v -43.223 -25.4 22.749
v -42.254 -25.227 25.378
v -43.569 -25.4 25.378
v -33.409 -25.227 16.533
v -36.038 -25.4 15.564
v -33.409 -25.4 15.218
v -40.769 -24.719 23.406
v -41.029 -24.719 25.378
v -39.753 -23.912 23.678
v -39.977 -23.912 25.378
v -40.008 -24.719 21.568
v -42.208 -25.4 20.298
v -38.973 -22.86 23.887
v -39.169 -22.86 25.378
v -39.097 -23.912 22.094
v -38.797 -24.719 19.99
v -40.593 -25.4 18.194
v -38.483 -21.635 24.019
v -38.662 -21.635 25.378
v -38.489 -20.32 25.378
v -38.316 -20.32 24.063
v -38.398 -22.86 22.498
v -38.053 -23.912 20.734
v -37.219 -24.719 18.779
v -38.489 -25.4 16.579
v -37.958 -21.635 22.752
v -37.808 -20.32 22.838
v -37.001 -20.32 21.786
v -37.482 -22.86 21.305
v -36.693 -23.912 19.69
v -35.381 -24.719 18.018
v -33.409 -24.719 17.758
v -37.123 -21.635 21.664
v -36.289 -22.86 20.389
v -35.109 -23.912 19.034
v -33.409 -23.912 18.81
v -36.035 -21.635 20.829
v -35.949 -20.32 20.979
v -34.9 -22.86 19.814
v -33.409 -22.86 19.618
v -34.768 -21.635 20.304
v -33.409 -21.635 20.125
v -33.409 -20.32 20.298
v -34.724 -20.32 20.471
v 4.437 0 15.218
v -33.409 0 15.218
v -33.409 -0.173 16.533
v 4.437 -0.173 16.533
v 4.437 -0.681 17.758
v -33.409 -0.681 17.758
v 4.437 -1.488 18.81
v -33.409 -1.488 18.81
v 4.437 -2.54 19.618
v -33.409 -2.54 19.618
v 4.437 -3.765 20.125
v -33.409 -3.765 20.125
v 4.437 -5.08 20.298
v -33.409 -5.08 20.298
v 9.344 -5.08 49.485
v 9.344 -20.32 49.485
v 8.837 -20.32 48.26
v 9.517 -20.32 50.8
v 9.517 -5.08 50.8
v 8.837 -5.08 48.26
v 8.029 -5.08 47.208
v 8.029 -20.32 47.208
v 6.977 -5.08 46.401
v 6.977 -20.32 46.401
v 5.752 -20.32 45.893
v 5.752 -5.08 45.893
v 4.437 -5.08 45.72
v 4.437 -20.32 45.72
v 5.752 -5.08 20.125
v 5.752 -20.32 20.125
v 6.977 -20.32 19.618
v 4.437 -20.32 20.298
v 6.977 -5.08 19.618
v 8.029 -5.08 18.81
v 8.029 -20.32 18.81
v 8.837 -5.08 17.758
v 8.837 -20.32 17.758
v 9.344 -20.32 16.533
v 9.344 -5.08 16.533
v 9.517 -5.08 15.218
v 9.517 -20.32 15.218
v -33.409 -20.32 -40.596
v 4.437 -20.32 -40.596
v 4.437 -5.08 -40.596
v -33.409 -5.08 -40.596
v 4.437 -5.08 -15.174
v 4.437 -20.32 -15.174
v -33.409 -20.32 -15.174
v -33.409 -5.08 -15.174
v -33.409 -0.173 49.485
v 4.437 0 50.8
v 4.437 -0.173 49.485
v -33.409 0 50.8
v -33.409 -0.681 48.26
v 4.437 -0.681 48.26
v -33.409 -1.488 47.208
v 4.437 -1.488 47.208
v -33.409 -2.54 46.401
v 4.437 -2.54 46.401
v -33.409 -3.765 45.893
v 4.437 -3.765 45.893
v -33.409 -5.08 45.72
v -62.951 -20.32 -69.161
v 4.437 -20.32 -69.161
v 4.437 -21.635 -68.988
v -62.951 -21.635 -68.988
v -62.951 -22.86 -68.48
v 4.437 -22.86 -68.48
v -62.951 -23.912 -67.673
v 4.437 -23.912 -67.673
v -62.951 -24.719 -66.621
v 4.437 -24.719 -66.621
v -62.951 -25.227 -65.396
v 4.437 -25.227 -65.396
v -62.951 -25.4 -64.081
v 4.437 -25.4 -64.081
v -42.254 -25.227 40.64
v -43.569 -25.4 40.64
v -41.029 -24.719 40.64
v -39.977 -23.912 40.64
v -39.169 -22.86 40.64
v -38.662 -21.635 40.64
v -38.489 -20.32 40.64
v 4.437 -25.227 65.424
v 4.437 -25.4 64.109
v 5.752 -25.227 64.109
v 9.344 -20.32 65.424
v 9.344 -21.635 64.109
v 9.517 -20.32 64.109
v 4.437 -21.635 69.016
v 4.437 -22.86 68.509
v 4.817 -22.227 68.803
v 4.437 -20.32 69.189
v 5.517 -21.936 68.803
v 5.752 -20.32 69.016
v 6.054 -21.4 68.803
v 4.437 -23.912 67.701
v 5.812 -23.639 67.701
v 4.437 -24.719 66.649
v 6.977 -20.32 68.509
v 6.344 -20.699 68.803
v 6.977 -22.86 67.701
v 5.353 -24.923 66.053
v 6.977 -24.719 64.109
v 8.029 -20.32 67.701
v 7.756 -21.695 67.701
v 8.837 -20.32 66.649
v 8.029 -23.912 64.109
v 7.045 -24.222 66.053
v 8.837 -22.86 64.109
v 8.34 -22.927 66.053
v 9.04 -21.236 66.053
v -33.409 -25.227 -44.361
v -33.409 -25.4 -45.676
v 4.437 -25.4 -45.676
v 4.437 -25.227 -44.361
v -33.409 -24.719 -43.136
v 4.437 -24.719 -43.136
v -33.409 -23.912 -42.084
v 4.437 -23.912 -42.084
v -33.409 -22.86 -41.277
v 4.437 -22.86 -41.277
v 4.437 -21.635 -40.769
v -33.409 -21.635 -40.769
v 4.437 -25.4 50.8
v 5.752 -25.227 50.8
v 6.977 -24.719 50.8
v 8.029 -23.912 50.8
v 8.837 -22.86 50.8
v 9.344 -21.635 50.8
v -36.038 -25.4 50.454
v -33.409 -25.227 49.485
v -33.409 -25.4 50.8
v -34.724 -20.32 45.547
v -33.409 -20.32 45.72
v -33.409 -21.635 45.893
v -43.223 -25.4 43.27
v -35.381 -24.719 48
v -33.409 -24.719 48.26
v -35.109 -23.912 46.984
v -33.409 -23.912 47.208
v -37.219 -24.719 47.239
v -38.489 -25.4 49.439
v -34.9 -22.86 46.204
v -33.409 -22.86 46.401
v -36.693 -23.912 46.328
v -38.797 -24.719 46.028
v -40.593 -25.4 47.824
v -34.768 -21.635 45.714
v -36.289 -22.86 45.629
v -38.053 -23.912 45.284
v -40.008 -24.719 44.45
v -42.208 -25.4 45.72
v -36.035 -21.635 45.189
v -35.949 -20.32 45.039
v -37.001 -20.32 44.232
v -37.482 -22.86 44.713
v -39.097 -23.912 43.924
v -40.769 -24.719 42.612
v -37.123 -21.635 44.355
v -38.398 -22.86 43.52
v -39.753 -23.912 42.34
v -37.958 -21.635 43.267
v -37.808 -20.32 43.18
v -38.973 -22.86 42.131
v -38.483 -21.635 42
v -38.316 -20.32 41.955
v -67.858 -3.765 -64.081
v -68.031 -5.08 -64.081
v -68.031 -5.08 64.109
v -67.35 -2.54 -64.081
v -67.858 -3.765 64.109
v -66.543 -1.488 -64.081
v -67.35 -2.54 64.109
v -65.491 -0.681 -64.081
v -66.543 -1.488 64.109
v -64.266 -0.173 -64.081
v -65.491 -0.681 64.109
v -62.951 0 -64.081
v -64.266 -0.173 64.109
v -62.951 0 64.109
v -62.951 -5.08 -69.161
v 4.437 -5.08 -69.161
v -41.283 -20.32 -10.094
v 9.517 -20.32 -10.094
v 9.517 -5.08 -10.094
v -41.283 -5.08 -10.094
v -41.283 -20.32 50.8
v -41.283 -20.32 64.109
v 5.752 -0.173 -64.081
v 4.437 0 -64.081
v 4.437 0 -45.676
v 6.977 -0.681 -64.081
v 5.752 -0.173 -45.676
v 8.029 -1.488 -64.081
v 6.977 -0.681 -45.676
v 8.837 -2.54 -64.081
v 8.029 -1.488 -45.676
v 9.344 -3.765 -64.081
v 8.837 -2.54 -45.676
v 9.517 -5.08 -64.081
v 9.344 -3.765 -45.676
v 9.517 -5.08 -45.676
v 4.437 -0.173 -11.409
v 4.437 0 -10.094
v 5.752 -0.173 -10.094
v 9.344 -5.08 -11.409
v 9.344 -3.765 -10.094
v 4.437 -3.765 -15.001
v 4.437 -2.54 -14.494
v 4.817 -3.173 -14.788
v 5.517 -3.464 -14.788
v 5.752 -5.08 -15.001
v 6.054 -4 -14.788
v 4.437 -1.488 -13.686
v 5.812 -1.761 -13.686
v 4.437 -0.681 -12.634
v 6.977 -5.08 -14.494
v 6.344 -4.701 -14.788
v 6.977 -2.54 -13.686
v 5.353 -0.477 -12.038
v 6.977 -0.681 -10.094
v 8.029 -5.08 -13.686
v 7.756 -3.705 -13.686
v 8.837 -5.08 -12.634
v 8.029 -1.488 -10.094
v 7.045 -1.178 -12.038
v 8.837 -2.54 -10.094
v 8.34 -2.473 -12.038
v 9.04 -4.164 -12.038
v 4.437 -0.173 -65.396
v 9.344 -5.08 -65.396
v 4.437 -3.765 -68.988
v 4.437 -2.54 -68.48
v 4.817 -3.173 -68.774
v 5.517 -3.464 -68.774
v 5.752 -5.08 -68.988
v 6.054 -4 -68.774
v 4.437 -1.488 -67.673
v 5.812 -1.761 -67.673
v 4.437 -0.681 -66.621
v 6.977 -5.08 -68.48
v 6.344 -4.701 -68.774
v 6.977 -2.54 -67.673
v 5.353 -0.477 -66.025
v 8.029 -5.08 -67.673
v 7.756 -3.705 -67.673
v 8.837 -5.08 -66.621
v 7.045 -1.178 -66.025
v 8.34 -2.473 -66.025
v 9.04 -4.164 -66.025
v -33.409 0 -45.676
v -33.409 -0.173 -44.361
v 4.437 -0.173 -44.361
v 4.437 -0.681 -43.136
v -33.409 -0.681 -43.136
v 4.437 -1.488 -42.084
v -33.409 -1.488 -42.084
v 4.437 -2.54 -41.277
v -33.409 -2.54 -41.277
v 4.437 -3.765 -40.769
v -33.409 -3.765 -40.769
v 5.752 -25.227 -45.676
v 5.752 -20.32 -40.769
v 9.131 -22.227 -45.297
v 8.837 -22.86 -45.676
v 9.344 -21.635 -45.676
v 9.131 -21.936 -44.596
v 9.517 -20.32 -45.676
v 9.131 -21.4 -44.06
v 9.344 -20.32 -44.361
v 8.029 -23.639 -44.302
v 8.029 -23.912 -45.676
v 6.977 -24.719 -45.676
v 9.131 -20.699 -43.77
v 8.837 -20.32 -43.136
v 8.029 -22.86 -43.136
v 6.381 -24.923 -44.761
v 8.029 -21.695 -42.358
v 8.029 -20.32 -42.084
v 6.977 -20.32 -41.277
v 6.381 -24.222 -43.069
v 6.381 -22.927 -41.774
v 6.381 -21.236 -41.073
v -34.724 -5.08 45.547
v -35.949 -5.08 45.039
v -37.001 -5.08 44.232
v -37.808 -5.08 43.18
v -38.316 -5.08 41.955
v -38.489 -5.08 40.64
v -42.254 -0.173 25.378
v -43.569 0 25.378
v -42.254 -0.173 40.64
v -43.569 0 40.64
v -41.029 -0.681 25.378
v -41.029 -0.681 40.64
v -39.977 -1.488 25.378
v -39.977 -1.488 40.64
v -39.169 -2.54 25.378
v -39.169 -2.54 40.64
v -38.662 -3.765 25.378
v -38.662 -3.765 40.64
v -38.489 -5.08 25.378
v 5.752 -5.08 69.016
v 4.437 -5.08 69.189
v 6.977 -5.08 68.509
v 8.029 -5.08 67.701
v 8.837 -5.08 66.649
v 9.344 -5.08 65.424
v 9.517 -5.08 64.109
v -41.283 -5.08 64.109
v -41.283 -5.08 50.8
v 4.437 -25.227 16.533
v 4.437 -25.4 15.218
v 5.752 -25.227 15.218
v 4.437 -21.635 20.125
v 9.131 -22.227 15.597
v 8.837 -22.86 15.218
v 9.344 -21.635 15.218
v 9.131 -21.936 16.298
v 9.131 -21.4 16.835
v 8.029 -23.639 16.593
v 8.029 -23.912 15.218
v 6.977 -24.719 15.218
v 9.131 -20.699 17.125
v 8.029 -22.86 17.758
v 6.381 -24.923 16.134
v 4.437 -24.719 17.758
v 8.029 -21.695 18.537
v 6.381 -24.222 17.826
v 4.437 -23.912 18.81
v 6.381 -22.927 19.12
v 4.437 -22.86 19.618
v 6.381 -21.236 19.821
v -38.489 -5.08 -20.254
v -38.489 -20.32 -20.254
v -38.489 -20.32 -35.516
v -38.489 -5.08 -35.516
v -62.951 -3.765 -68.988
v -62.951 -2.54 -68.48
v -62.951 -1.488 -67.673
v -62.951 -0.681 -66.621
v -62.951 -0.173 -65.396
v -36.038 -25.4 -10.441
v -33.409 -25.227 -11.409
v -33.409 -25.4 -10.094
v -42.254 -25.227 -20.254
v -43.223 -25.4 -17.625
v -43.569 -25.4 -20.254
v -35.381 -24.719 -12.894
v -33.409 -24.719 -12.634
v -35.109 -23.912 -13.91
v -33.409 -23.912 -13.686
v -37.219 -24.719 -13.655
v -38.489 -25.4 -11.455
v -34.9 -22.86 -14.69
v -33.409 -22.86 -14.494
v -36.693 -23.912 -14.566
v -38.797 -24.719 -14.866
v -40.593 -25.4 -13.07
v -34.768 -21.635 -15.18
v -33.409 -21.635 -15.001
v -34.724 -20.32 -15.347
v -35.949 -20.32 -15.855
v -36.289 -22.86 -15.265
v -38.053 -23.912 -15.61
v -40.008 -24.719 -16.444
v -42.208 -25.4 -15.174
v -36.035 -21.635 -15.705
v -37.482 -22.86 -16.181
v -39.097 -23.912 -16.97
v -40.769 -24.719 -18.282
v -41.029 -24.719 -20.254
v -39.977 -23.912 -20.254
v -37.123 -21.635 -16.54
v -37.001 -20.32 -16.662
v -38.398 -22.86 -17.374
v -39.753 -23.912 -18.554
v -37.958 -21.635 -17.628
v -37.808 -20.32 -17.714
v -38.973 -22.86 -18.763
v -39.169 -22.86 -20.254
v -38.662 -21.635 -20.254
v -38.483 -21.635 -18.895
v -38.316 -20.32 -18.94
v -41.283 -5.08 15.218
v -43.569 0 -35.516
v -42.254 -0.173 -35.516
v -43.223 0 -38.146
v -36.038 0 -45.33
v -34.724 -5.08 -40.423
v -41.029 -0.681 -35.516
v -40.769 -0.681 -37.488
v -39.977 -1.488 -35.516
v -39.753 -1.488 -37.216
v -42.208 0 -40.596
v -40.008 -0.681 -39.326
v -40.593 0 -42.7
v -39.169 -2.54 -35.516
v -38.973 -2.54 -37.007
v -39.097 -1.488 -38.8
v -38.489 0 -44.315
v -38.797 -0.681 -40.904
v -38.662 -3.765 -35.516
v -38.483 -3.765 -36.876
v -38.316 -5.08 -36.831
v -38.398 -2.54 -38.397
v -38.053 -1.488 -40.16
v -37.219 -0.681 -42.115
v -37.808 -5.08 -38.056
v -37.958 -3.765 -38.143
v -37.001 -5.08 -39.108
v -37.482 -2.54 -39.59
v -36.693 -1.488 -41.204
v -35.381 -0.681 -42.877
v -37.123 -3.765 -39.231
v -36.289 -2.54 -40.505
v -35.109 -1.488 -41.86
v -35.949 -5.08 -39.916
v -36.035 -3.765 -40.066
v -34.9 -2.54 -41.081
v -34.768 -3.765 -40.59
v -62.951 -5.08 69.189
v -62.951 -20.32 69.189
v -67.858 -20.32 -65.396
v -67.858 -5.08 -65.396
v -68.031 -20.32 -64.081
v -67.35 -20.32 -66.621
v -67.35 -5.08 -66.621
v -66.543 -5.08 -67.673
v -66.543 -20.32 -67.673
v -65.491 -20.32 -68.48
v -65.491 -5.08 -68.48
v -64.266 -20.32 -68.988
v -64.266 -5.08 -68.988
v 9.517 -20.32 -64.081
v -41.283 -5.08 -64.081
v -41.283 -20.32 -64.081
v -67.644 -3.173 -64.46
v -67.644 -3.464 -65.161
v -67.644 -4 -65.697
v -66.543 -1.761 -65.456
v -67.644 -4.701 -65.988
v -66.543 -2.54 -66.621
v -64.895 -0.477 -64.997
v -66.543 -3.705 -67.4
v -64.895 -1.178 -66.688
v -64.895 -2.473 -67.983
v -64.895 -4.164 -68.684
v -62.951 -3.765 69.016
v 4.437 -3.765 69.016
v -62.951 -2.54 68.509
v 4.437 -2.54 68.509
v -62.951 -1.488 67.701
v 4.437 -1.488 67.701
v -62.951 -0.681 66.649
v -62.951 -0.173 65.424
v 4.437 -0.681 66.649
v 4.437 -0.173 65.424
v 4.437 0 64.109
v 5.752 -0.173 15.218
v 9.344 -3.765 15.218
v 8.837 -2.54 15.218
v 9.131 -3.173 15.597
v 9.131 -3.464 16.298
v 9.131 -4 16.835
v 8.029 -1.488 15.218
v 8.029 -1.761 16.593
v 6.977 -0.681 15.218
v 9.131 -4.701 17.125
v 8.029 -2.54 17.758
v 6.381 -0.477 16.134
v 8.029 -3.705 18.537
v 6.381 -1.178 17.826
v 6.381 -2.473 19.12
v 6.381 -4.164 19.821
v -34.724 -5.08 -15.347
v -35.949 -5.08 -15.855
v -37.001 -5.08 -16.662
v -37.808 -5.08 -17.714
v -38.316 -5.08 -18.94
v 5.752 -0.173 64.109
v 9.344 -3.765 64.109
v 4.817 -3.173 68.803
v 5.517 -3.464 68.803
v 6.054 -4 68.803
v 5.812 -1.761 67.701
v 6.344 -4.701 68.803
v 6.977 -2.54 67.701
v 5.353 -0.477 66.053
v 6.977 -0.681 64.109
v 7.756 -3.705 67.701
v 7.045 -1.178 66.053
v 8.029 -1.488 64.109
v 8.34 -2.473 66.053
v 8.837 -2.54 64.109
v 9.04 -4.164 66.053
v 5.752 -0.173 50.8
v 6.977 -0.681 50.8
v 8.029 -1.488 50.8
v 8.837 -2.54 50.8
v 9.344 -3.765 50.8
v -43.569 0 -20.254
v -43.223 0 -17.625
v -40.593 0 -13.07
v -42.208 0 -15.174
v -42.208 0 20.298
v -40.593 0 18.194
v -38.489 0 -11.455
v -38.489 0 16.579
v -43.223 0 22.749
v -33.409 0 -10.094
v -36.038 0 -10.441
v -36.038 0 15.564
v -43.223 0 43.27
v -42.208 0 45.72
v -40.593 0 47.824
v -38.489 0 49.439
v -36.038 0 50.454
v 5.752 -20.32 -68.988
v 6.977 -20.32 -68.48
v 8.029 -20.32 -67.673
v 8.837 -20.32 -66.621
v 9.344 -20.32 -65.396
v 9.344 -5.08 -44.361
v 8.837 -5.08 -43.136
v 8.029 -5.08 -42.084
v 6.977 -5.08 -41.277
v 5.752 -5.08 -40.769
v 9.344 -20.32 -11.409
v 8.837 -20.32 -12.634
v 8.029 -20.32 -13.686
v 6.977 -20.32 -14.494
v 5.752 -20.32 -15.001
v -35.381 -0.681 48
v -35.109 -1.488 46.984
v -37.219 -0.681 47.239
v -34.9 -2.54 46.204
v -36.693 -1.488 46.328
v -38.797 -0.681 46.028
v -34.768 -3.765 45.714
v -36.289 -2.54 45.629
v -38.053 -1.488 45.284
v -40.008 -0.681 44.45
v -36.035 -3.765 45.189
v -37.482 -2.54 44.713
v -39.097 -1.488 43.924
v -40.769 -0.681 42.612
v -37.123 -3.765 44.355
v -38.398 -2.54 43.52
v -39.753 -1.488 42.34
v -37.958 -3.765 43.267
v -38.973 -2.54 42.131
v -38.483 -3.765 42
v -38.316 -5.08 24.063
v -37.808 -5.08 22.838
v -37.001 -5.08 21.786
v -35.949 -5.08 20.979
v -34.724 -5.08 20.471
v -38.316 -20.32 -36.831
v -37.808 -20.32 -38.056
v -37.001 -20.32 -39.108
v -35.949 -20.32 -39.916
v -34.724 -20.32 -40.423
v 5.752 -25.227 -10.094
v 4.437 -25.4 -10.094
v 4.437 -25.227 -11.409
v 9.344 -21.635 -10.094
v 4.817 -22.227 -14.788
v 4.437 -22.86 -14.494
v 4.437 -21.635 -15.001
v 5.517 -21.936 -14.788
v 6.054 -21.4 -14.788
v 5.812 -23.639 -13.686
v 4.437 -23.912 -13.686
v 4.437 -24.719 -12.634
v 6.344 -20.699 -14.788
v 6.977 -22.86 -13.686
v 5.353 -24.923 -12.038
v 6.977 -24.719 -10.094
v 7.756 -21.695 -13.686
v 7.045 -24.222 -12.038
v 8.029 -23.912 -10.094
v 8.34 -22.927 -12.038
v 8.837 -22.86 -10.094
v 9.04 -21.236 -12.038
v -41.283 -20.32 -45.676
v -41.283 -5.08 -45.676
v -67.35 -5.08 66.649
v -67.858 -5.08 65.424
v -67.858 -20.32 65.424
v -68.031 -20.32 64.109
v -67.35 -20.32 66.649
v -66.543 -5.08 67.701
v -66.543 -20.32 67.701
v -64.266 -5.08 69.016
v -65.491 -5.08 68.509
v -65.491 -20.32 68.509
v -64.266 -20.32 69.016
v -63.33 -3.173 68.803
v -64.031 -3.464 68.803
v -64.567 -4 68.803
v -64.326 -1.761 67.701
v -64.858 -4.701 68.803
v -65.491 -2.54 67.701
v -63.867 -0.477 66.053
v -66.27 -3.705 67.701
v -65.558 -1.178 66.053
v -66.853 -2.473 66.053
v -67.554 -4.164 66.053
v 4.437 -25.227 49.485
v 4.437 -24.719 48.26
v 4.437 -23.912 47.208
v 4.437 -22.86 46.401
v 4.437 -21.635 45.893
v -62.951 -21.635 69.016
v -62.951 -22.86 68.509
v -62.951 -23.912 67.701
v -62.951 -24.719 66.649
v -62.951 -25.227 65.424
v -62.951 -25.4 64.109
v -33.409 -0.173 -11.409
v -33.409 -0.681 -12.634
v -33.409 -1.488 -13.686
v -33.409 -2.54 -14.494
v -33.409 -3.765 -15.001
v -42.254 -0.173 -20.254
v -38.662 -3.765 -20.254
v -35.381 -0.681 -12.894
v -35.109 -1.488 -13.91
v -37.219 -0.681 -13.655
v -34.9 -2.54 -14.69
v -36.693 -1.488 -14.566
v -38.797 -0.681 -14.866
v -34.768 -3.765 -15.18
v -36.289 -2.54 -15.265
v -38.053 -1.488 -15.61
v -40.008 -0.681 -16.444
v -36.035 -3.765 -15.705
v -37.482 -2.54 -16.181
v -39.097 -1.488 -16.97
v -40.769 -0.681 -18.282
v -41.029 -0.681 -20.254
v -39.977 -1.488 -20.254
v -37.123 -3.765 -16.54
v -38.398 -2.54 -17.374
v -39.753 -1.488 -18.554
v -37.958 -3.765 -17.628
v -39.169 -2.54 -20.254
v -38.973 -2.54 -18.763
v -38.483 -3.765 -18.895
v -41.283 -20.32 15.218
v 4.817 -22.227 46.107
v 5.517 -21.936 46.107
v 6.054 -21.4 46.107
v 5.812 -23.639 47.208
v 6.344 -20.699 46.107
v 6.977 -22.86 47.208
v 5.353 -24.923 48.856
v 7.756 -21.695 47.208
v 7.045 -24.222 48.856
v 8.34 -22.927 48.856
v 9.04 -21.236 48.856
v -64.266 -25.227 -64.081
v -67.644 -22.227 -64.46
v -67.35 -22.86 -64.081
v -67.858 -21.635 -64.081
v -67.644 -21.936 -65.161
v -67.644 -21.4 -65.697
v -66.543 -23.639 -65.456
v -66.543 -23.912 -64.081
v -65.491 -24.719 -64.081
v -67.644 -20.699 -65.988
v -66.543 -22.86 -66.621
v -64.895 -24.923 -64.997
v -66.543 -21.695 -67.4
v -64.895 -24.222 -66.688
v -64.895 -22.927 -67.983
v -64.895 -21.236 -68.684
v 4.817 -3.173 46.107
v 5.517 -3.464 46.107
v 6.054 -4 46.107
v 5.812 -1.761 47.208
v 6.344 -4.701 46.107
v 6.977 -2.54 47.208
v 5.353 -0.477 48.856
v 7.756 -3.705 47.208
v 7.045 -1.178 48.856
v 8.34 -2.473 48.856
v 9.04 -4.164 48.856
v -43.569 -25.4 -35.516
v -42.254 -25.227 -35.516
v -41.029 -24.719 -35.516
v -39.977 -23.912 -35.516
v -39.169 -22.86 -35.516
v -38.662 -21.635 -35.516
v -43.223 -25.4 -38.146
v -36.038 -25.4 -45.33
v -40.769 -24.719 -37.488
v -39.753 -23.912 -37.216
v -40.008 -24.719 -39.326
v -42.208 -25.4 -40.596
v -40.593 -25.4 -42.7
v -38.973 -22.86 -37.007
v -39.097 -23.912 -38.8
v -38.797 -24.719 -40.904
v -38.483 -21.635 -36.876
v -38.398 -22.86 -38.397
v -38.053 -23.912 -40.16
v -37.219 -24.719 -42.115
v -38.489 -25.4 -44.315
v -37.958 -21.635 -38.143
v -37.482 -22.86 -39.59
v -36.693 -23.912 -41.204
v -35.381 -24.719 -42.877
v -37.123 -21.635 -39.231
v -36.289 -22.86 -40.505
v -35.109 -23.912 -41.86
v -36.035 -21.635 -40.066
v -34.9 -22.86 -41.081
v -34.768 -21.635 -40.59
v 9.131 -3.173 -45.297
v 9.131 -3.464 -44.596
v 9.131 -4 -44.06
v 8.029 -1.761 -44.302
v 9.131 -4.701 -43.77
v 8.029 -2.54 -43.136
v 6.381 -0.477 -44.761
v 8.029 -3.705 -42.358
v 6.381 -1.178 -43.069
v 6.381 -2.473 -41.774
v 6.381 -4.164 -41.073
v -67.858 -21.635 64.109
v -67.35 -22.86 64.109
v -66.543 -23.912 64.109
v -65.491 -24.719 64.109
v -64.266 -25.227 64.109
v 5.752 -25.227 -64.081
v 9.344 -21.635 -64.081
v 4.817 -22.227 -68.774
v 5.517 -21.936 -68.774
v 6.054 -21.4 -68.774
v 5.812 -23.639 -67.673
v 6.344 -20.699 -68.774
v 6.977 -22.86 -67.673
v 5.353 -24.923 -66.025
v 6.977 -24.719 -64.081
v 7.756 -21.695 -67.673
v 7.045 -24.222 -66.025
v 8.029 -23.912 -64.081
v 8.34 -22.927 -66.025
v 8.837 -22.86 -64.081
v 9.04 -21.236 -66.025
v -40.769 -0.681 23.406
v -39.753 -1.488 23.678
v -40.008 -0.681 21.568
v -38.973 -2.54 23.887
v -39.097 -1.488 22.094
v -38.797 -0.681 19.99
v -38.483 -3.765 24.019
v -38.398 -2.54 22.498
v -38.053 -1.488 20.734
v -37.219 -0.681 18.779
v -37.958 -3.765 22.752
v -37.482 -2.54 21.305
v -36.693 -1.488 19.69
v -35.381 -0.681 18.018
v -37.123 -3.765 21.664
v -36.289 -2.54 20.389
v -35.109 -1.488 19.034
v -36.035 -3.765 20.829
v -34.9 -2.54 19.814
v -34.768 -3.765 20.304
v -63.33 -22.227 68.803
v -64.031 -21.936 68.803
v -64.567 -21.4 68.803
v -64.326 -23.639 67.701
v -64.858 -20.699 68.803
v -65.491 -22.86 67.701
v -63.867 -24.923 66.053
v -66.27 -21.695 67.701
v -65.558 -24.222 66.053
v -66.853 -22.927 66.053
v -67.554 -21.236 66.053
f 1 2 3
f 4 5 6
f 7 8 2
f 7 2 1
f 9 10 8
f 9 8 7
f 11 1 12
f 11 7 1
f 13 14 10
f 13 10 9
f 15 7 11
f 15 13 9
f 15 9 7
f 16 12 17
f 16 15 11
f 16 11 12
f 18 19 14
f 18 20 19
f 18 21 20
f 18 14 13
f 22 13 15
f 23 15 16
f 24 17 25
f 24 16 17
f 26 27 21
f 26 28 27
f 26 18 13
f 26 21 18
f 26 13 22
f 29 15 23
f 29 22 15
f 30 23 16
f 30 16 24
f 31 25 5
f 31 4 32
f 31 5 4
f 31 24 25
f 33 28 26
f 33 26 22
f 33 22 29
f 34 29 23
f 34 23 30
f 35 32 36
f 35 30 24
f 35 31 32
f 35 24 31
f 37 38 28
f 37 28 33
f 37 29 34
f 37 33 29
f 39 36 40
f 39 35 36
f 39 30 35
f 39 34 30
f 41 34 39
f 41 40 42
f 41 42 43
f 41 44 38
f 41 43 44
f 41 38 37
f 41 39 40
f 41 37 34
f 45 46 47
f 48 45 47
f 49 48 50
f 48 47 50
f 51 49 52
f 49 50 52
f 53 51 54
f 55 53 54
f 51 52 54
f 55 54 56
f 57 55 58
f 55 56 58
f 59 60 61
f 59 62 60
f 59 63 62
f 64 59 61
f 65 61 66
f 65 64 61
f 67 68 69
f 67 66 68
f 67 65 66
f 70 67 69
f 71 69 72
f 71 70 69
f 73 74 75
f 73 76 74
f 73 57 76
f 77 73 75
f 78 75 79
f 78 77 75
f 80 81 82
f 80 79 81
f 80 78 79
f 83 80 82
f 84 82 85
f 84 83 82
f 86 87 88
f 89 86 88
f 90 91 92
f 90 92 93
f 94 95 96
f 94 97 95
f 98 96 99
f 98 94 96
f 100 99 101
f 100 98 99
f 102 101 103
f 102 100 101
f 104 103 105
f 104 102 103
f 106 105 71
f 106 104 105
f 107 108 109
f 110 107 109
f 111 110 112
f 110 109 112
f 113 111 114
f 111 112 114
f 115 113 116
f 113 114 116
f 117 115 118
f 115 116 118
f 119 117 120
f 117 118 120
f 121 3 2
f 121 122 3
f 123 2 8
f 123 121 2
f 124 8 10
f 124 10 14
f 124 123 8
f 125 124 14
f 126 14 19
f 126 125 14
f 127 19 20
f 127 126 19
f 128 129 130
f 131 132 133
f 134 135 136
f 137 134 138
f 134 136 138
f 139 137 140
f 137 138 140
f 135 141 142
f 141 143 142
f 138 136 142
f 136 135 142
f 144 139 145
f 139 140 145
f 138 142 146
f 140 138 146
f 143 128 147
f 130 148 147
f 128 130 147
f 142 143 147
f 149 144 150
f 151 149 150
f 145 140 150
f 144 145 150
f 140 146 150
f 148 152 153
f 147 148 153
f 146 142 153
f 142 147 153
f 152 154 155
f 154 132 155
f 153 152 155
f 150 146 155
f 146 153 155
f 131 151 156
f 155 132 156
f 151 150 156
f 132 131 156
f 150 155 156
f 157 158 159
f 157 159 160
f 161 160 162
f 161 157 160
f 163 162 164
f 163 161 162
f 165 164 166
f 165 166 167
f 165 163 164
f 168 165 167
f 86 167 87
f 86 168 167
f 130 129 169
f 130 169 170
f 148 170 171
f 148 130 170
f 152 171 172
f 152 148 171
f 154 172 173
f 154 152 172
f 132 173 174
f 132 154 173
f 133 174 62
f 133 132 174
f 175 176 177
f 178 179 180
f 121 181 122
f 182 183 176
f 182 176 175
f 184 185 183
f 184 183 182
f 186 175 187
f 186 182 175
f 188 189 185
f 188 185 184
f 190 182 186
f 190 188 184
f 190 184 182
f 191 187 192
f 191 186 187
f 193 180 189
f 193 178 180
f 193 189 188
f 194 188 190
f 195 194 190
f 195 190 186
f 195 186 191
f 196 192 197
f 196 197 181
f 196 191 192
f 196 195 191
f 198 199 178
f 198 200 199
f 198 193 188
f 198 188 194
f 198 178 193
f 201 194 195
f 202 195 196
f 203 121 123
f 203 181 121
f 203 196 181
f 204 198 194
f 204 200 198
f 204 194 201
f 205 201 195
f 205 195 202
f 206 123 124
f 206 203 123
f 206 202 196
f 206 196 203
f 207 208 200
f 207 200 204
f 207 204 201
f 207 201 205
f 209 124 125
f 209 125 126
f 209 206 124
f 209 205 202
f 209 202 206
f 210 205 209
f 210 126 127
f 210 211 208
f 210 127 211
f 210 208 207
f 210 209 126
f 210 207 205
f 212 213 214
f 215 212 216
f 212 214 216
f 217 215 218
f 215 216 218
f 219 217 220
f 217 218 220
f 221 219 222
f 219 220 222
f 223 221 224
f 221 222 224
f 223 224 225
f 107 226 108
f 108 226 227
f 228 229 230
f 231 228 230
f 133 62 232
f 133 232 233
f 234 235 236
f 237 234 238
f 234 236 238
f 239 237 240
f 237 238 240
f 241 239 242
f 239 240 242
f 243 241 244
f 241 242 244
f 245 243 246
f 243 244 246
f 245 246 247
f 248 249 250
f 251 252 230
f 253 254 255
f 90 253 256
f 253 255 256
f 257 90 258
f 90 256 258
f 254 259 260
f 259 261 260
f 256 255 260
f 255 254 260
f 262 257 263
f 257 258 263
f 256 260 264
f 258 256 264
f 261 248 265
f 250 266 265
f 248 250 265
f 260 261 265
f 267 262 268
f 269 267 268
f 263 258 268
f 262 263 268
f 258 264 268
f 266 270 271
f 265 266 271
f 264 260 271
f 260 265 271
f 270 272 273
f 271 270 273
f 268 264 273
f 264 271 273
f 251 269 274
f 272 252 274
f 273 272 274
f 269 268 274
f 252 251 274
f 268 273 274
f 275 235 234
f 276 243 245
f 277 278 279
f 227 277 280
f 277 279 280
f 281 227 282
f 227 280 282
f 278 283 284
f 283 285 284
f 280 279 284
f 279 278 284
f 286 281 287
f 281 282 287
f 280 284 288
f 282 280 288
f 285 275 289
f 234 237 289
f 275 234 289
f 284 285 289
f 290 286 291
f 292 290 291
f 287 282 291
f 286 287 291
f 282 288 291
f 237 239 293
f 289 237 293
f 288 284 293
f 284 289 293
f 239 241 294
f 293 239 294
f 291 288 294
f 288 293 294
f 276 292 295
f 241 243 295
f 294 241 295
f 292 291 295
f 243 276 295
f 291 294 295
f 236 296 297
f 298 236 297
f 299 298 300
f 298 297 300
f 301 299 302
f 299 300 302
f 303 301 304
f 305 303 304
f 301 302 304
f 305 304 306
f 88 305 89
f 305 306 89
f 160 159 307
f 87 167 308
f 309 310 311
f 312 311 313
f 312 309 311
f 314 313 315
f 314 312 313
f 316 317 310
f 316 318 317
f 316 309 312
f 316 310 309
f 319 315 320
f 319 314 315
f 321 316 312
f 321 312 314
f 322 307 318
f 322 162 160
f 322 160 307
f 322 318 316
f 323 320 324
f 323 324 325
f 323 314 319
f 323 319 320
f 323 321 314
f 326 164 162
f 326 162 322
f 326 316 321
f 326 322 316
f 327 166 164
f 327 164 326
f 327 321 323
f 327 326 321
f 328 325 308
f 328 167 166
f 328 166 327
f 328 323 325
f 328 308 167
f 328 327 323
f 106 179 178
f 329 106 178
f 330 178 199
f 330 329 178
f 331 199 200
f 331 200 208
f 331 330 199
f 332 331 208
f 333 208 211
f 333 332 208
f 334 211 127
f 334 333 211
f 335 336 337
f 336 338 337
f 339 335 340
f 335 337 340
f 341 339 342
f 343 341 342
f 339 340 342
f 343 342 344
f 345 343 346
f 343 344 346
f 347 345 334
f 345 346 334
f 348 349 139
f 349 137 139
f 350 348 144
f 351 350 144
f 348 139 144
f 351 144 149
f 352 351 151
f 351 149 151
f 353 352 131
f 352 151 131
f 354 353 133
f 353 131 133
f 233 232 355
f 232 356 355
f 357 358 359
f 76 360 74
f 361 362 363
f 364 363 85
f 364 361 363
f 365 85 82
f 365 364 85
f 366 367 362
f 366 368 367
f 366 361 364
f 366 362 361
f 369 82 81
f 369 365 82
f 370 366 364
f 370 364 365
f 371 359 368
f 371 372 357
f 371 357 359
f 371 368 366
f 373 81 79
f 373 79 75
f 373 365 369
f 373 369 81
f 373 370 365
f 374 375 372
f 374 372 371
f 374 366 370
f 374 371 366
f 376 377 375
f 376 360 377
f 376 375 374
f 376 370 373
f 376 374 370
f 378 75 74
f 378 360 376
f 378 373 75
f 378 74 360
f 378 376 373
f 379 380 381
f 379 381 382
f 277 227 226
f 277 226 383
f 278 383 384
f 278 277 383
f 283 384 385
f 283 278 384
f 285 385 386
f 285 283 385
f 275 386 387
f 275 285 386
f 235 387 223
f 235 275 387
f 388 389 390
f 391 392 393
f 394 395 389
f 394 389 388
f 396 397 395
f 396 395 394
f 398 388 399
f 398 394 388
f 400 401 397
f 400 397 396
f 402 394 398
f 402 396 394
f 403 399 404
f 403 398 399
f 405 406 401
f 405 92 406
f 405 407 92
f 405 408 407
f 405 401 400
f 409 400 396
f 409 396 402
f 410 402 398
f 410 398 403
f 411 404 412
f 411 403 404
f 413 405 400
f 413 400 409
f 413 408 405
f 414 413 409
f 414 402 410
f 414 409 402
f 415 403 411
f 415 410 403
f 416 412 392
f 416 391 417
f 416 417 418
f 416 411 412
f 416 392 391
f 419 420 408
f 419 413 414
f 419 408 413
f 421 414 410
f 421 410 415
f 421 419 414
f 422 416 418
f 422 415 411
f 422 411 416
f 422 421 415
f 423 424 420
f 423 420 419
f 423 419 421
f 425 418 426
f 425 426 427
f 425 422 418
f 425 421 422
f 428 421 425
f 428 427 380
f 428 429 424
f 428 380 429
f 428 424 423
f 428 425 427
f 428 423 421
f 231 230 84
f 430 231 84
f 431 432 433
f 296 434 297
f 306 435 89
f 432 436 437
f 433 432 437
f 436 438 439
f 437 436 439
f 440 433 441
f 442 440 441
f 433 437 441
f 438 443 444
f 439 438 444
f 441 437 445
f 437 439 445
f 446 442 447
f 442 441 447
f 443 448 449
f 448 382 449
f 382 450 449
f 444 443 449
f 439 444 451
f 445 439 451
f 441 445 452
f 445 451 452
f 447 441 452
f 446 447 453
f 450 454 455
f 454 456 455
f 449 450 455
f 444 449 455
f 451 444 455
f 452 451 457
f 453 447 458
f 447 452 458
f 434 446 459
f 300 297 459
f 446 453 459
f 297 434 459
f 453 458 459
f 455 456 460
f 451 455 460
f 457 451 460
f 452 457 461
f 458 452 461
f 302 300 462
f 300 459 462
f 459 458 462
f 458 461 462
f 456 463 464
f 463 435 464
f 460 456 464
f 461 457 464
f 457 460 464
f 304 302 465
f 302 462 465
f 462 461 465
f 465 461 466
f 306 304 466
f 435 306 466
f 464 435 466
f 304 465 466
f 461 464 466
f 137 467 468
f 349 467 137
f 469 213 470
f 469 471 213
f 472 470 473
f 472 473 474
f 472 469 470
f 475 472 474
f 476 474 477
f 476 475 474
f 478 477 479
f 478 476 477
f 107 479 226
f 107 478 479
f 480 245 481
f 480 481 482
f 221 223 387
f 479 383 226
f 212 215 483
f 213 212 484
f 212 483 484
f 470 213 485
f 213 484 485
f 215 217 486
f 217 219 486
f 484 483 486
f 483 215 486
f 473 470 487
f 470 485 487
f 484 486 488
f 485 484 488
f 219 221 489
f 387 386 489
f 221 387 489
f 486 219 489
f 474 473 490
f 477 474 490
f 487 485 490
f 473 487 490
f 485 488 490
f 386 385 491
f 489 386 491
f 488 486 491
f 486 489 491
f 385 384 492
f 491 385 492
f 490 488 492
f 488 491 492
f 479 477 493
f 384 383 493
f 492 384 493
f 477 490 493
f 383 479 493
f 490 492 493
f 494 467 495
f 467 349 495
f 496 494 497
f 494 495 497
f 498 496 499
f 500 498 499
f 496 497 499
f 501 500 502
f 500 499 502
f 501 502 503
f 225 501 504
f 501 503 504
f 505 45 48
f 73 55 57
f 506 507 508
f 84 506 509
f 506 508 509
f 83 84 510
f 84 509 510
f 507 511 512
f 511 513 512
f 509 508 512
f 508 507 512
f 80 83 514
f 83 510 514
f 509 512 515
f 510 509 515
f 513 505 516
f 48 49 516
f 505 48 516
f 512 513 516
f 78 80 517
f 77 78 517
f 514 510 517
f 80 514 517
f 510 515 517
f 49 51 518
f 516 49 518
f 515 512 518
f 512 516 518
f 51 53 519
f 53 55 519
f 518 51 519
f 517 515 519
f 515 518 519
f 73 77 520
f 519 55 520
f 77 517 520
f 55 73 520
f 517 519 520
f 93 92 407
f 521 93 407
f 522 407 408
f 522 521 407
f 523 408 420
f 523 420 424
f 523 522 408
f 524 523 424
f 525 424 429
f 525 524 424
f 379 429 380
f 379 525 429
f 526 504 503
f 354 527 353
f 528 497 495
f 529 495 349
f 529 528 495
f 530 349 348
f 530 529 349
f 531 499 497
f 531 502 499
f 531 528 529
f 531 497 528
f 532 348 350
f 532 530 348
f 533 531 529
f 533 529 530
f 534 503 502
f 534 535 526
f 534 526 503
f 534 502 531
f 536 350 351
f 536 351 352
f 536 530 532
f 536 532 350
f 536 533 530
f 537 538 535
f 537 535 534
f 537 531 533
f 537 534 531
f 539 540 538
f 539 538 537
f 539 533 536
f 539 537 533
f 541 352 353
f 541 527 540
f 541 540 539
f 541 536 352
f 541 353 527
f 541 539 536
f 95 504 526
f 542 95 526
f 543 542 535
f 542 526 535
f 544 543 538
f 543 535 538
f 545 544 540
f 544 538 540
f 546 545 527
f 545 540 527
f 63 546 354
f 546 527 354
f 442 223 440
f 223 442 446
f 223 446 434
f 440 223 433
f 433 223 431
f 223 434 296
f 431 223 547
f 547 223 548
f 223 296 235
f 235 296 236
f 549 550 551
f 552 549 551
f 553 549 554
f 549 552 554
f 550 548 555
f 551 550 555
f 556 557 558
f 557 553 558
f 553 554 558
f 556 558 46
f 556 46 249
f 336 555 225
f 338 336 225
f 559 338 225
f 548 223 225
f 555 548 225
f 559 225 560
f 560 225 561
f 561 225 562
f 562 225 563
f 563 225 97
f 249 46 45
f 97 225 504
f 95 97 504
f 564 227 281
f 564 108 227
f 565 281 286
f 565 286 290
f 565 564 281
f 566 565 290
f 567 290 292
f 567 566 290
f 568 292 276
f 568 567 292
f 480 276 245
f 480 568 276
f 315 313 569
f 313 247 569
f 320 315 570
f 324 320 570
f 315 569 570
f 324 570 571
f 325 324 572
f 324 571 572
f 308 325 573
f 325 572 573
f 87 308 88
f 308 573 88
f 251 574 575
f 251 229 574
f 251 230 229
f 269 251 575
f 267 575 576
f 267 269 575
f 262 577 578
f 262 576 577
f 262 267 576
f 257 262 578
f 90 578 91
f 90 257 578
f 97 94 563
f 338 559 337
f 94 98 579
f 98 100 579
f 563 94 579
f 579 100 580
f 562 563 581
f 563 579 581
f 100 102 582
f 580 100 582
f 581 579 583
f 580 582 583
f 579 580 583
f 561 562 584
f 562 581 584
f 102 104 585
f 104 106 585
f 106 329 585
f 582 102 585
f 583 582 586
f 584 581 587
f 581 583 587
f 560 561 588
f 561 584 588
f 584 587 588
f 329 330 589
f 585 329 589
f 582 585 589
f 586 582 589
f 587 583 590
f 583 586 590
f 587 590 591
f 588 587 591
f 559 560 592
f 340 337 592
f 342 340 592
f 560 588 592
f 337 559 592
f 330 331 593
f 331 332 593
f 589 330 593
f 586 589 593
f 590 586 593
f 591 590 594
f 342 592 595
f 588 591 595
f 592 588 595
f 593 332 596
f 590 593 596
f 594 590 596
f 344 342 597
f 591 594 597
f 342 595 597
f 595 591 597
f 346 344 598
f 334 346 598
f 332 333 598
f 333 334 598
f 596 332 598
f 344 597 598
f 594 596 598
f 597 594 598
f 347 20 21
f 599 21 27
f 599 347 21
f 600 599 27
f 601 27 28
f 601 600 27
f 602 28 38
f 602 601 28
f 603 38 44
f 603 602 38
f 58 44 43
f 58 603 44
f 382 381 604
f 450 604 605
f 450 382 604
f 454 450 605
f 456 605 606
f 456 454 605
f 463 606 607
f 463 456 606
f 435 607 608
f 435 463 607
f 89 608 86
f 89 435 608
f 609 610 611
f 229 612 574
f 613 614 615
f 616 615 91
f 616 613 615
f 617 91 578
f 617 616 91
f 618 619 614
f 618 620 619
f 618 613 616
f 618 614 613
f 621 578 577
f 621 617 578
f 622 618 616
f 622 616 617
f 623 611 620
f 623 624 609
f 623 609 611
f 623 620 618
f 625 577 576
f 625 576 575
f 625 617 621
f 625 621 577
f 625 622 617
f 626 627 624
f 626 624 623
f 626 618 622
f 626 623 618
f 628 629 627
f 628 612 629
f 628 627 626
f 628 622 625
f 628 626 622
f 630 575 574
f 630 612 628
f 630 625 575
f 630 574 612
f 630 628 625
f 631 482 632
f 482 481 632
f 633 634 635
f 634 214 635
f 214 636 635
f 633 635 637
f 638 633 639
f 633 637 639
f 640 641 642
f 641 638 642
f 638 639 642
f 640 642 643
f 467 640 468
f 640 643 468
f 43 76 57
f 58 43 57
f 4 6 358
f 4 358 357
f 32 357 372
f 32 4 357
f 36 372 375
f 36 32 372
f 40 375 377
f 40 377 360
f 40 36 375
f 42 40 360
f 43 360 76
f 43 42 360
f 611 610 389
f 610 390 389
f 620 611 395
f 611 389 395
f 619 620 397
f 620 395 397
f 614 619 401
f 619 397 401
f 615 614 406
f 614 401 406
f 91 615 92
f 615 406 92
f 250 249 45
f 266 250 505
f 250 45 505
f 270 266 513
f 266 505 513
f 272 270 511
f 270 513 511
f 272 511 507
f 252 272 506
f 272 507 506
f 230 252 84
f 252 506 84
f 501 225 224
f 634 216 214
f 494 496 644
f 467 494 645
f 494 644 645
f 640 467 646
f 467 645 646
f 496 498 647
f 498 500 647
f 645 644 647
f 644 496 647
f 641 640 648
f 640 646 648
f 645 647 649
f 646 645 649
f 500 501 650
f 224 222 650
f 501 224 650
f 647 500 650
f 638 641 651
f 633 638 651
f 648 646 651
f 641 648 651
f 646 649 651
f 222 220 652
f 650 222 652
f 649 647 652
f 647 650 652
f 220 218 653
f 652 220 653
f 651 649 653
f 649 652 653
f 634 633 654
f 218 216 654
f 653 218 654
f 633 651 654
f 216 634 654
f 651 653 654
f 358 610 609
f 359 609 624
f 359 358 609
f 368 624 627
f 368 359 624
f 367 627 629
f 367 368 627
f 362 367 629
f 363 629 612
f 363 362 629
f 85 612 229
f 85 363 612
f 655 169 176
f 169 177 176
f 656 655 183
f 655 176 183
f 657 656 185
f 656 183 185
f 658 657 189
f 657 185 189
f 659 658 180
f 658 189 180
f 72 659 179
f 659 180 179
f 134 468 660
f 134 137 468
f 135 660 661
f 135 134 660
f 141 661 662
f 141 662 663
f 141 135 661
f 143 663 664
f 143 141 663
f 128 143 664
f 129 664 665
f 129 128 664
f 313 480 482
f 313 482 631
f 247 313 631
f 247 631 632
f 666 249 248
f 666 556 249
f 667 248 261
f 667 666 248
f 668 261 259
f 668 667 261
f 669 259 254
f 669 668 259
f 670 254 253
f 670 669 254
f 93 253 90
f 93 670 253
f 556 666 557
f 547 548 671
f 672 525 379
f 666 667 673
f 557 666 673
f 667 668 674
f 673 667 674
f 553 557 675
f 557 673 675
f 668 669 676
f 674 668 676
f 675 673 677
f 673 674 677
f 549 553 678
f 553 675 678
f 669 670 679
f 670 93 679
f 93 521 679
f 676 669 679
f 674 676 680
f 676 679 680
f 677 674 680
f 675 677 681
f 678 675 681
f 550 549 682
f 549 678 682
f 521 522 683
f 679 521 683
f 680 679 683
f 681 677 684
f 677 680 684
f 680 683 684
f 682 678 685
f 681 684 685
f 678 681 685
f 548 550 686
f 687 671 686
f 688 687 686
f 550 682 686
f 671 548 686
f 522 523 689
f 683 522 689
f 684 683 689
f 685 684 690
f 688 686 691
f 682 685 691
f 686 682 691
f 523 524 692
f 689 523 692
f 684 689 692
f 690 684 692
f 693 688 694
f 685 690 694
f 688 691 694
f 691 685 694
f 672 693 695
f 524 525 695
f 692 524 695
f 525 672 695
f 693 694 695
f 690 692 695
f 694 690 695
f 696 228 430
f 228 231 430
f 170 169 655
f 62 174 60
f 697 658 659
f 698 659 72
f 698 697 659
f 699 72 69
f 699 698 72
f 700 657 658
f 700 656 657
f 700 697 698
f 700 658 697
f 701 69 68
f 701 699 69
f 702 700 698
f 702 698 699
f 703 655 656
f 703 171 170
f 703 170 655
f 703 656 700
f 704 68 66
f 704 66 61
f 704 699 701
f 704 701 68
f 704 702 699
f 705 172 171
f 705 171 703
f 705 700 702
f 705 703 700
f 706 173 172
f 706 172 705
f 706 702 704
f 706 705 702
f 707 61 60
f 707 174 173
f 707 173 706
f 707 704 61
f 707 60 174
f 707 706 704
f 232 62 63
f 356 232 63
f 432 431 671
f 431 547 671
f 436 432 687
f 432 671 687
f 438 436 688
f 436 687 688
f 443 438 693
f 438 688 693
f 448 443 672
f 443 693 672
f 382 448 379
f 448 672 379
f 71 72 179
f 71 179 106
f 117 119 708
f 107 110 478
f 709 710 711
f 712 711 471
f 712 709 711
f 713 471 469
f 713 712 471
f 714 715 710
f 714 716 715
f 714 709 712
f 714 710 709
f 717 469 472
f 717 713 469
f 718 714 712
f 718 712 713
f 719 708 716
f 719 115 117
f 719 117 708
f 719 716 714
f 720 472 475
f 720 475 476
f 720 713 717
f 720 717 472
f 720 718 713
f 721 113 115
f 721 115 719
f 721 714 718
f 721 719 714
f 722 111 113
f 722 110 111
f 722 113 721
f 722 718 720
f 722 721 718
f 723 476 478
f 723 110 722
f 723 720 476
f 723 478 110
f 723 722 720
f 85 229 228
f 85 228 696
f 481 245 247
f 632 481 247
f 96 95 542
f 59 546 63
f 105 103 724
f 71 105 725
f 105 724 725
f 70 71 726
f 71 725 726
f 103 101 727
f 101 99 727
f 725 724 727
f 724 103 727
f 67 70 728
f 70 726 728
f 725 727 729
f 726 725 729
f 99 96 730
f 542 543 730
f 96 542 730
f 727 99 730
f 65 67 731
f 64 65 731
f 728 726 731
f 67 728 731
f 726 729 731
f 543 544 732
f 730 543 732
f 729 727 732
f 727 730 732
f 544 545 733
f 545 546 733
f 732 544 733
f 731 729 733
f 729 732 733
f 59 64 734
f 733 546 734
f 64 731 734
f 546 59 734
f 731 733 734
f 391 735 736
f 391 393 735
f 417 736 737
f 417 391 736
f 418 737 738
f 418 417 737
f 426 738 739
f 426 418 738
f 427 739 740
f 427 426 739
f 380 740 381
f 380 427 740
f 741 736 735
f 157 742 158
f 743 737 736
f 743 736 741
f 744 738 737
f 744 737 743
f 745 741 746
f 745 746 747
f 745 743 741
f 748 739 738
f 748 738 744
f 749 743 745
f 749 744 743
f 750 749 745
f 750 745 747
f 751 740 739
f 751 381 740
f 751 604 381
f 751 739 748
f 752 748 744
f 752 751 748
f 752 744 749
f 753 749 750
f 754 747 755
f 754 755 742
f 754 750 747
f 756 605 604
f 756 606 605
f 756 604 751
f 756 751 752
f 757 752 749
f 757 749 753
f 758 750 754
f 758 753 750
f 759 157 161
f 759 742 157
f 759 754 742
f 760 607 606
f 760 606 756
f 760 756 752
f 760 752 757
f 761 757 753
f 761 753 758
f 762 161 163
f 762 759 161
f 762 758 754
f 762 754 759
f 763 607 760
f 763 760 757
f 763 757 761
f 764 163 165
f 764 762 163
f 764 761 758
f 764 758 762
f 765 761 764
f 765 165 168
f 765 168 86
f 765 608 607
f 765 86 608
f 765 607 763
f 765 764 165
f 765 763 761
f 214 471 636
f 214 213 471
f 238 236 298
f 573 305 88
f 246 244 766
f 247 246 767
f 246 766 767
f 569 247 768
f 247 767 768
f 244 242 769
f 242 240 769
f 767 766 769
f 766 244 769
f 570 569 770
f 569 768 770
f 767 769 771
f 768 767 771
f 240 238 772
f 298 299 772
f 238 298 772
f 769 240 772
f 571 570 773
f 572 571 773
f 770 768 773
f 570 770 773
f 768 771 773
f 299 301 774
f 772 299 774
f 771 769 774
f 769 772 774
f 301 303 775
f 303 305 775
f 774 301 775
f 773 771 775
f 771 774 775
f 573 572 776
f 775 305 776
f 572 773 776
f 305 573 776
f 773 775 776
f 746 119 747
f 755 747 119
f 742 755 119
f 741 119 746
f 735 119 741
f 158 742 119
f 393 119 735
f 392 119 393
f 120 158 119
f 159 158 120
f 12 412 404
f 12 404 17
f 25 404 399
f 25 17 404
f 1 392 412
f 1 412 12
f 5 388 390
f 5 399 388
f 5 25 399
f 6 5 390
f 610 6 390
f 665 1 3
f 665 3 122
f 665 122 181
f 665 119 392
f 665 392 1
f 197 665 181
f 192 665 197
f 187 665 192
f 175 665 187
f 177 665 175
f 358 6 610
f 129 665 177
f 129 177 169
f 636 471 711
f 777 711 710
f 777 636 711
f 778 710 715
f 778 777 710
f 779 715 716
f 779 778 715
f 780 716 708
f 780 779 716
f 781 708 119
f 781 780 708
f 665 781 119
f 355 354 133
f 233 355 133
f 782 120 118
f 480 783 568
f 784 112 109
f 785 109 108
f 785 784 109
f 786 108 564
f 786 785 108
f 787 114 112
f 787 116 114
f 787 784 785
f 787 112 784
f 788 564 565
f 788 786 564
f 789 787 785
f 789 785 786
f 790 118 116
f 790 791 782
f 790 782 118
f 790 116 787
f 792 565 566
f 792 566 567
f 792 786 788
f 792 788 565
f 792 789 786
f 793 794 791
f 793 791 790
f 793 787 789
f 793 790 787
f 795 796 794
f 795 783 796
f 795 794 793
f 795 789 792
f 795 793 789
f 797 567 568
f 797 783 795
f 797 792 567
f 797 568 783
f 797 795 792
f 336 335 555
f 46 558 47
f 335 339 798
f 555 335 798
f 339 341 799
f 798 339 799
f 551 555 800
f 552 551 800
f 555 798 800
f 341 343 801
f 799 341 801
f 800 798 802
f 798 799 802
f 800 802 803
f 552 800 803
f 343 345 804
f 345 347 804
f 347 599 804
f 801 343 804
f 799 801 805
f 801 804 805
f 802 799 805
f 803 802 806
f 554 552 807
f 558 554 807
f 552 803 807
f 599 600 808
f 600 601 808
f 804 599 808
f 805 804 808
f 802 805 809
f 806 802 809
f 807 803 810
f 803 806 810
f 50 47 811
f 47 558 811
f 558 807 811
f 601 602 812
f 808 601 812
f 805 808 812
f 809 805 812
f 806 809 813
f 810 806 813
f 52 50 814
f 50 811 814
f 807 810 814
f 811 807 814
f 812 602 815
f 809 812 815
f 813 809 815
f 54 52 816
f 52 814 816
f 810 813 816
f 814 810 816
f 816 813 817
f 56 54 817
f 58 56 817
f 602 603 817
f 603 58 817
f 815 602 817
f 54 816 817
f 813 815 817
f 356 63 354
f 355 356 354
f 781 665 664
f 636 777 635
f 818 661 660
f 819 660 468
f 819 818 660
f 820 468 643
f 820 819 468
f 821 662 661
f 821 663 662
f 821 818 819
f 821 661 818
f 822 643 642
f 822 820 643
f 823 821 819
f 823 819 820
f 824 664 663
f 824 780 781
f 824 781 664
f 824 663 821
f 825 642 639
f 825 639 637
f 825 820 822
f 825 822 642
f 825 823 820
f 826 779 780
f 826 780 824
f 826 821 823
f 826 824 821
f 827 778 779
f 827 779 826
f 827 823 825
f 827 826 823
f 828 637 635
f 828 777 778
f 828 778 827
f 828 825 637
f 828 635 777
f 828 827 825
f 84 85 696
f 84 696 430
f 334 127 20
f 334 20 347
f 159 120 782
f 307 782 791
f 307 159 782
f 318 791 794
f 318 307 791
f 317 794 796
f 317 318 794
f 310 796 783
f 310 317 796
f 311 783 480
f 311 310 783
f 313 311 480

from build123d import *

# Parameters (mm, degrees)
F0_W     = 77.5483176112
F0_H     = 138.3502483368
F1_DEPTH = 25.4
F2_W     = 25.4
F2_H     = 25.4218988121
F3_DEPTH = 48.006
F4_R     = 5.08
F5_DEPTH = 50.8
F6_DEPTH = 50.8
F7_DEPTH = 50.8


with BuildPart() as f1:
    # F0 (on Front) → F1 (new body)
    with BuildSketch(Plane.XZ):
        with Locations((-29.2568616569, 0.0140890479)):
            Rectangle(F0_W, F0_H)
    extrude(amount=F1_DEPTH)

    # F2 (on face) → F3 (cut)
    with BuildSketch(Plane.YZ.offset(9.5172971487)):
        with Locations((-12.7, 33.0090541393)):
            Rectangle(F2_W, F2_H)
        with Locations((-12.7, -27.8852600604)):
            Rectangle(F2_W, F2_H)
    extrude(amount=-F3_DEPTH, mode=Mode.SUBTRACT)

    # F4
    f4_edges = [f1.edges().sort_by_distance(p)[0] for p in [
        (9.517297, -25.4, 57.454608),
        (-14.485703, -25.4, 45.720004),
        (-38.488703, -25.4, 33.009054),
        (-14.485703, -25.4, 20.298105),
        (9.517297, -25.4, 2.561897),
        (-14.485703, -25.4, -15.174311),
        (-38.488703, -25.4, -27.88526),
        (-14.485703, -25.4, -40.596209),
        (9.517297, -25.4, -54.878622),
        (-29.256862, -25.4, -69.161035),
        (-68.03102, -25.4, 0.014089),
        (-29.256862, -25.4, 69.189213),
        (9.517297, 0, 57.454608),
        (-14.485703, 0, 45.720004),
        (-38.488703, 0, 33.009054),
        (-14.485703, 0, 20.298105),
        (9.517297, 0, 2.561897),
        (-14.485703, 0, -15.174311),
        (-38.488703, 0, -27.88526),
        (-14.485703, 0, -40.596209),
        (9.517297, 0, -54.878622),
        (-29.256862, 0, -69.161035),
        (-68.03102, 0, 0.014089),
        (-29.256862, 0, 69.189213),
        (-68.03102, -12.7, 69.189213),
        (-68.03102, -12.7, -69.161035),
        (9.517297, -12.7, 69.189213),
        (9.517297, -12.7, 45.720004),
        (-38.488703, -12.7, 45.720004),
        (9.517297, -12.7, -15.174311),
        (-38.488703, -12.7, -15.174311),
        (9.517297, -12.7, 20.298105),
        (-38.488703, -12.7, 20.298105),
        (9.517297, -12.7, -69.161035),
        (9.517297, -12.7, -40.596209),
        (-38.488703, -12.7, -40.596209),
    ]]
    fillet(f4_edges, radius=F4_R)

    # F5 (cut): a face of the model
    f5_faces = [f1.faces().sort_by_distance(p)[0] for p in [
        (9.5172971487, -12.7, 57.4546083808),
    ]]
    extrude(f5_faces, amount=-F5_DEPTH, mode=Mode.SUBTRACT)

    # F6 (cut): a face of the model
    f6_faces = [f1.faces().sort_by_distance(p)[0] for p in [
        (9.5172971487, -12.7, 2.5618970394),
    ]]
    extrude(f6_faces, amount=-F6_DEPTH, mode=Mode.SUBTRACT)

    # F7 (cut): a face of the model
    f7_faces = [f1.faces().sort_by_distance(p)[0] for p in [
        (9.5172971487, -12.7, -54.8786222935),
    ]]
    extrude(f7_faces, amount=-F7_DEPTH, mode=Mode.SUBTRACT)


solid = f1.part
